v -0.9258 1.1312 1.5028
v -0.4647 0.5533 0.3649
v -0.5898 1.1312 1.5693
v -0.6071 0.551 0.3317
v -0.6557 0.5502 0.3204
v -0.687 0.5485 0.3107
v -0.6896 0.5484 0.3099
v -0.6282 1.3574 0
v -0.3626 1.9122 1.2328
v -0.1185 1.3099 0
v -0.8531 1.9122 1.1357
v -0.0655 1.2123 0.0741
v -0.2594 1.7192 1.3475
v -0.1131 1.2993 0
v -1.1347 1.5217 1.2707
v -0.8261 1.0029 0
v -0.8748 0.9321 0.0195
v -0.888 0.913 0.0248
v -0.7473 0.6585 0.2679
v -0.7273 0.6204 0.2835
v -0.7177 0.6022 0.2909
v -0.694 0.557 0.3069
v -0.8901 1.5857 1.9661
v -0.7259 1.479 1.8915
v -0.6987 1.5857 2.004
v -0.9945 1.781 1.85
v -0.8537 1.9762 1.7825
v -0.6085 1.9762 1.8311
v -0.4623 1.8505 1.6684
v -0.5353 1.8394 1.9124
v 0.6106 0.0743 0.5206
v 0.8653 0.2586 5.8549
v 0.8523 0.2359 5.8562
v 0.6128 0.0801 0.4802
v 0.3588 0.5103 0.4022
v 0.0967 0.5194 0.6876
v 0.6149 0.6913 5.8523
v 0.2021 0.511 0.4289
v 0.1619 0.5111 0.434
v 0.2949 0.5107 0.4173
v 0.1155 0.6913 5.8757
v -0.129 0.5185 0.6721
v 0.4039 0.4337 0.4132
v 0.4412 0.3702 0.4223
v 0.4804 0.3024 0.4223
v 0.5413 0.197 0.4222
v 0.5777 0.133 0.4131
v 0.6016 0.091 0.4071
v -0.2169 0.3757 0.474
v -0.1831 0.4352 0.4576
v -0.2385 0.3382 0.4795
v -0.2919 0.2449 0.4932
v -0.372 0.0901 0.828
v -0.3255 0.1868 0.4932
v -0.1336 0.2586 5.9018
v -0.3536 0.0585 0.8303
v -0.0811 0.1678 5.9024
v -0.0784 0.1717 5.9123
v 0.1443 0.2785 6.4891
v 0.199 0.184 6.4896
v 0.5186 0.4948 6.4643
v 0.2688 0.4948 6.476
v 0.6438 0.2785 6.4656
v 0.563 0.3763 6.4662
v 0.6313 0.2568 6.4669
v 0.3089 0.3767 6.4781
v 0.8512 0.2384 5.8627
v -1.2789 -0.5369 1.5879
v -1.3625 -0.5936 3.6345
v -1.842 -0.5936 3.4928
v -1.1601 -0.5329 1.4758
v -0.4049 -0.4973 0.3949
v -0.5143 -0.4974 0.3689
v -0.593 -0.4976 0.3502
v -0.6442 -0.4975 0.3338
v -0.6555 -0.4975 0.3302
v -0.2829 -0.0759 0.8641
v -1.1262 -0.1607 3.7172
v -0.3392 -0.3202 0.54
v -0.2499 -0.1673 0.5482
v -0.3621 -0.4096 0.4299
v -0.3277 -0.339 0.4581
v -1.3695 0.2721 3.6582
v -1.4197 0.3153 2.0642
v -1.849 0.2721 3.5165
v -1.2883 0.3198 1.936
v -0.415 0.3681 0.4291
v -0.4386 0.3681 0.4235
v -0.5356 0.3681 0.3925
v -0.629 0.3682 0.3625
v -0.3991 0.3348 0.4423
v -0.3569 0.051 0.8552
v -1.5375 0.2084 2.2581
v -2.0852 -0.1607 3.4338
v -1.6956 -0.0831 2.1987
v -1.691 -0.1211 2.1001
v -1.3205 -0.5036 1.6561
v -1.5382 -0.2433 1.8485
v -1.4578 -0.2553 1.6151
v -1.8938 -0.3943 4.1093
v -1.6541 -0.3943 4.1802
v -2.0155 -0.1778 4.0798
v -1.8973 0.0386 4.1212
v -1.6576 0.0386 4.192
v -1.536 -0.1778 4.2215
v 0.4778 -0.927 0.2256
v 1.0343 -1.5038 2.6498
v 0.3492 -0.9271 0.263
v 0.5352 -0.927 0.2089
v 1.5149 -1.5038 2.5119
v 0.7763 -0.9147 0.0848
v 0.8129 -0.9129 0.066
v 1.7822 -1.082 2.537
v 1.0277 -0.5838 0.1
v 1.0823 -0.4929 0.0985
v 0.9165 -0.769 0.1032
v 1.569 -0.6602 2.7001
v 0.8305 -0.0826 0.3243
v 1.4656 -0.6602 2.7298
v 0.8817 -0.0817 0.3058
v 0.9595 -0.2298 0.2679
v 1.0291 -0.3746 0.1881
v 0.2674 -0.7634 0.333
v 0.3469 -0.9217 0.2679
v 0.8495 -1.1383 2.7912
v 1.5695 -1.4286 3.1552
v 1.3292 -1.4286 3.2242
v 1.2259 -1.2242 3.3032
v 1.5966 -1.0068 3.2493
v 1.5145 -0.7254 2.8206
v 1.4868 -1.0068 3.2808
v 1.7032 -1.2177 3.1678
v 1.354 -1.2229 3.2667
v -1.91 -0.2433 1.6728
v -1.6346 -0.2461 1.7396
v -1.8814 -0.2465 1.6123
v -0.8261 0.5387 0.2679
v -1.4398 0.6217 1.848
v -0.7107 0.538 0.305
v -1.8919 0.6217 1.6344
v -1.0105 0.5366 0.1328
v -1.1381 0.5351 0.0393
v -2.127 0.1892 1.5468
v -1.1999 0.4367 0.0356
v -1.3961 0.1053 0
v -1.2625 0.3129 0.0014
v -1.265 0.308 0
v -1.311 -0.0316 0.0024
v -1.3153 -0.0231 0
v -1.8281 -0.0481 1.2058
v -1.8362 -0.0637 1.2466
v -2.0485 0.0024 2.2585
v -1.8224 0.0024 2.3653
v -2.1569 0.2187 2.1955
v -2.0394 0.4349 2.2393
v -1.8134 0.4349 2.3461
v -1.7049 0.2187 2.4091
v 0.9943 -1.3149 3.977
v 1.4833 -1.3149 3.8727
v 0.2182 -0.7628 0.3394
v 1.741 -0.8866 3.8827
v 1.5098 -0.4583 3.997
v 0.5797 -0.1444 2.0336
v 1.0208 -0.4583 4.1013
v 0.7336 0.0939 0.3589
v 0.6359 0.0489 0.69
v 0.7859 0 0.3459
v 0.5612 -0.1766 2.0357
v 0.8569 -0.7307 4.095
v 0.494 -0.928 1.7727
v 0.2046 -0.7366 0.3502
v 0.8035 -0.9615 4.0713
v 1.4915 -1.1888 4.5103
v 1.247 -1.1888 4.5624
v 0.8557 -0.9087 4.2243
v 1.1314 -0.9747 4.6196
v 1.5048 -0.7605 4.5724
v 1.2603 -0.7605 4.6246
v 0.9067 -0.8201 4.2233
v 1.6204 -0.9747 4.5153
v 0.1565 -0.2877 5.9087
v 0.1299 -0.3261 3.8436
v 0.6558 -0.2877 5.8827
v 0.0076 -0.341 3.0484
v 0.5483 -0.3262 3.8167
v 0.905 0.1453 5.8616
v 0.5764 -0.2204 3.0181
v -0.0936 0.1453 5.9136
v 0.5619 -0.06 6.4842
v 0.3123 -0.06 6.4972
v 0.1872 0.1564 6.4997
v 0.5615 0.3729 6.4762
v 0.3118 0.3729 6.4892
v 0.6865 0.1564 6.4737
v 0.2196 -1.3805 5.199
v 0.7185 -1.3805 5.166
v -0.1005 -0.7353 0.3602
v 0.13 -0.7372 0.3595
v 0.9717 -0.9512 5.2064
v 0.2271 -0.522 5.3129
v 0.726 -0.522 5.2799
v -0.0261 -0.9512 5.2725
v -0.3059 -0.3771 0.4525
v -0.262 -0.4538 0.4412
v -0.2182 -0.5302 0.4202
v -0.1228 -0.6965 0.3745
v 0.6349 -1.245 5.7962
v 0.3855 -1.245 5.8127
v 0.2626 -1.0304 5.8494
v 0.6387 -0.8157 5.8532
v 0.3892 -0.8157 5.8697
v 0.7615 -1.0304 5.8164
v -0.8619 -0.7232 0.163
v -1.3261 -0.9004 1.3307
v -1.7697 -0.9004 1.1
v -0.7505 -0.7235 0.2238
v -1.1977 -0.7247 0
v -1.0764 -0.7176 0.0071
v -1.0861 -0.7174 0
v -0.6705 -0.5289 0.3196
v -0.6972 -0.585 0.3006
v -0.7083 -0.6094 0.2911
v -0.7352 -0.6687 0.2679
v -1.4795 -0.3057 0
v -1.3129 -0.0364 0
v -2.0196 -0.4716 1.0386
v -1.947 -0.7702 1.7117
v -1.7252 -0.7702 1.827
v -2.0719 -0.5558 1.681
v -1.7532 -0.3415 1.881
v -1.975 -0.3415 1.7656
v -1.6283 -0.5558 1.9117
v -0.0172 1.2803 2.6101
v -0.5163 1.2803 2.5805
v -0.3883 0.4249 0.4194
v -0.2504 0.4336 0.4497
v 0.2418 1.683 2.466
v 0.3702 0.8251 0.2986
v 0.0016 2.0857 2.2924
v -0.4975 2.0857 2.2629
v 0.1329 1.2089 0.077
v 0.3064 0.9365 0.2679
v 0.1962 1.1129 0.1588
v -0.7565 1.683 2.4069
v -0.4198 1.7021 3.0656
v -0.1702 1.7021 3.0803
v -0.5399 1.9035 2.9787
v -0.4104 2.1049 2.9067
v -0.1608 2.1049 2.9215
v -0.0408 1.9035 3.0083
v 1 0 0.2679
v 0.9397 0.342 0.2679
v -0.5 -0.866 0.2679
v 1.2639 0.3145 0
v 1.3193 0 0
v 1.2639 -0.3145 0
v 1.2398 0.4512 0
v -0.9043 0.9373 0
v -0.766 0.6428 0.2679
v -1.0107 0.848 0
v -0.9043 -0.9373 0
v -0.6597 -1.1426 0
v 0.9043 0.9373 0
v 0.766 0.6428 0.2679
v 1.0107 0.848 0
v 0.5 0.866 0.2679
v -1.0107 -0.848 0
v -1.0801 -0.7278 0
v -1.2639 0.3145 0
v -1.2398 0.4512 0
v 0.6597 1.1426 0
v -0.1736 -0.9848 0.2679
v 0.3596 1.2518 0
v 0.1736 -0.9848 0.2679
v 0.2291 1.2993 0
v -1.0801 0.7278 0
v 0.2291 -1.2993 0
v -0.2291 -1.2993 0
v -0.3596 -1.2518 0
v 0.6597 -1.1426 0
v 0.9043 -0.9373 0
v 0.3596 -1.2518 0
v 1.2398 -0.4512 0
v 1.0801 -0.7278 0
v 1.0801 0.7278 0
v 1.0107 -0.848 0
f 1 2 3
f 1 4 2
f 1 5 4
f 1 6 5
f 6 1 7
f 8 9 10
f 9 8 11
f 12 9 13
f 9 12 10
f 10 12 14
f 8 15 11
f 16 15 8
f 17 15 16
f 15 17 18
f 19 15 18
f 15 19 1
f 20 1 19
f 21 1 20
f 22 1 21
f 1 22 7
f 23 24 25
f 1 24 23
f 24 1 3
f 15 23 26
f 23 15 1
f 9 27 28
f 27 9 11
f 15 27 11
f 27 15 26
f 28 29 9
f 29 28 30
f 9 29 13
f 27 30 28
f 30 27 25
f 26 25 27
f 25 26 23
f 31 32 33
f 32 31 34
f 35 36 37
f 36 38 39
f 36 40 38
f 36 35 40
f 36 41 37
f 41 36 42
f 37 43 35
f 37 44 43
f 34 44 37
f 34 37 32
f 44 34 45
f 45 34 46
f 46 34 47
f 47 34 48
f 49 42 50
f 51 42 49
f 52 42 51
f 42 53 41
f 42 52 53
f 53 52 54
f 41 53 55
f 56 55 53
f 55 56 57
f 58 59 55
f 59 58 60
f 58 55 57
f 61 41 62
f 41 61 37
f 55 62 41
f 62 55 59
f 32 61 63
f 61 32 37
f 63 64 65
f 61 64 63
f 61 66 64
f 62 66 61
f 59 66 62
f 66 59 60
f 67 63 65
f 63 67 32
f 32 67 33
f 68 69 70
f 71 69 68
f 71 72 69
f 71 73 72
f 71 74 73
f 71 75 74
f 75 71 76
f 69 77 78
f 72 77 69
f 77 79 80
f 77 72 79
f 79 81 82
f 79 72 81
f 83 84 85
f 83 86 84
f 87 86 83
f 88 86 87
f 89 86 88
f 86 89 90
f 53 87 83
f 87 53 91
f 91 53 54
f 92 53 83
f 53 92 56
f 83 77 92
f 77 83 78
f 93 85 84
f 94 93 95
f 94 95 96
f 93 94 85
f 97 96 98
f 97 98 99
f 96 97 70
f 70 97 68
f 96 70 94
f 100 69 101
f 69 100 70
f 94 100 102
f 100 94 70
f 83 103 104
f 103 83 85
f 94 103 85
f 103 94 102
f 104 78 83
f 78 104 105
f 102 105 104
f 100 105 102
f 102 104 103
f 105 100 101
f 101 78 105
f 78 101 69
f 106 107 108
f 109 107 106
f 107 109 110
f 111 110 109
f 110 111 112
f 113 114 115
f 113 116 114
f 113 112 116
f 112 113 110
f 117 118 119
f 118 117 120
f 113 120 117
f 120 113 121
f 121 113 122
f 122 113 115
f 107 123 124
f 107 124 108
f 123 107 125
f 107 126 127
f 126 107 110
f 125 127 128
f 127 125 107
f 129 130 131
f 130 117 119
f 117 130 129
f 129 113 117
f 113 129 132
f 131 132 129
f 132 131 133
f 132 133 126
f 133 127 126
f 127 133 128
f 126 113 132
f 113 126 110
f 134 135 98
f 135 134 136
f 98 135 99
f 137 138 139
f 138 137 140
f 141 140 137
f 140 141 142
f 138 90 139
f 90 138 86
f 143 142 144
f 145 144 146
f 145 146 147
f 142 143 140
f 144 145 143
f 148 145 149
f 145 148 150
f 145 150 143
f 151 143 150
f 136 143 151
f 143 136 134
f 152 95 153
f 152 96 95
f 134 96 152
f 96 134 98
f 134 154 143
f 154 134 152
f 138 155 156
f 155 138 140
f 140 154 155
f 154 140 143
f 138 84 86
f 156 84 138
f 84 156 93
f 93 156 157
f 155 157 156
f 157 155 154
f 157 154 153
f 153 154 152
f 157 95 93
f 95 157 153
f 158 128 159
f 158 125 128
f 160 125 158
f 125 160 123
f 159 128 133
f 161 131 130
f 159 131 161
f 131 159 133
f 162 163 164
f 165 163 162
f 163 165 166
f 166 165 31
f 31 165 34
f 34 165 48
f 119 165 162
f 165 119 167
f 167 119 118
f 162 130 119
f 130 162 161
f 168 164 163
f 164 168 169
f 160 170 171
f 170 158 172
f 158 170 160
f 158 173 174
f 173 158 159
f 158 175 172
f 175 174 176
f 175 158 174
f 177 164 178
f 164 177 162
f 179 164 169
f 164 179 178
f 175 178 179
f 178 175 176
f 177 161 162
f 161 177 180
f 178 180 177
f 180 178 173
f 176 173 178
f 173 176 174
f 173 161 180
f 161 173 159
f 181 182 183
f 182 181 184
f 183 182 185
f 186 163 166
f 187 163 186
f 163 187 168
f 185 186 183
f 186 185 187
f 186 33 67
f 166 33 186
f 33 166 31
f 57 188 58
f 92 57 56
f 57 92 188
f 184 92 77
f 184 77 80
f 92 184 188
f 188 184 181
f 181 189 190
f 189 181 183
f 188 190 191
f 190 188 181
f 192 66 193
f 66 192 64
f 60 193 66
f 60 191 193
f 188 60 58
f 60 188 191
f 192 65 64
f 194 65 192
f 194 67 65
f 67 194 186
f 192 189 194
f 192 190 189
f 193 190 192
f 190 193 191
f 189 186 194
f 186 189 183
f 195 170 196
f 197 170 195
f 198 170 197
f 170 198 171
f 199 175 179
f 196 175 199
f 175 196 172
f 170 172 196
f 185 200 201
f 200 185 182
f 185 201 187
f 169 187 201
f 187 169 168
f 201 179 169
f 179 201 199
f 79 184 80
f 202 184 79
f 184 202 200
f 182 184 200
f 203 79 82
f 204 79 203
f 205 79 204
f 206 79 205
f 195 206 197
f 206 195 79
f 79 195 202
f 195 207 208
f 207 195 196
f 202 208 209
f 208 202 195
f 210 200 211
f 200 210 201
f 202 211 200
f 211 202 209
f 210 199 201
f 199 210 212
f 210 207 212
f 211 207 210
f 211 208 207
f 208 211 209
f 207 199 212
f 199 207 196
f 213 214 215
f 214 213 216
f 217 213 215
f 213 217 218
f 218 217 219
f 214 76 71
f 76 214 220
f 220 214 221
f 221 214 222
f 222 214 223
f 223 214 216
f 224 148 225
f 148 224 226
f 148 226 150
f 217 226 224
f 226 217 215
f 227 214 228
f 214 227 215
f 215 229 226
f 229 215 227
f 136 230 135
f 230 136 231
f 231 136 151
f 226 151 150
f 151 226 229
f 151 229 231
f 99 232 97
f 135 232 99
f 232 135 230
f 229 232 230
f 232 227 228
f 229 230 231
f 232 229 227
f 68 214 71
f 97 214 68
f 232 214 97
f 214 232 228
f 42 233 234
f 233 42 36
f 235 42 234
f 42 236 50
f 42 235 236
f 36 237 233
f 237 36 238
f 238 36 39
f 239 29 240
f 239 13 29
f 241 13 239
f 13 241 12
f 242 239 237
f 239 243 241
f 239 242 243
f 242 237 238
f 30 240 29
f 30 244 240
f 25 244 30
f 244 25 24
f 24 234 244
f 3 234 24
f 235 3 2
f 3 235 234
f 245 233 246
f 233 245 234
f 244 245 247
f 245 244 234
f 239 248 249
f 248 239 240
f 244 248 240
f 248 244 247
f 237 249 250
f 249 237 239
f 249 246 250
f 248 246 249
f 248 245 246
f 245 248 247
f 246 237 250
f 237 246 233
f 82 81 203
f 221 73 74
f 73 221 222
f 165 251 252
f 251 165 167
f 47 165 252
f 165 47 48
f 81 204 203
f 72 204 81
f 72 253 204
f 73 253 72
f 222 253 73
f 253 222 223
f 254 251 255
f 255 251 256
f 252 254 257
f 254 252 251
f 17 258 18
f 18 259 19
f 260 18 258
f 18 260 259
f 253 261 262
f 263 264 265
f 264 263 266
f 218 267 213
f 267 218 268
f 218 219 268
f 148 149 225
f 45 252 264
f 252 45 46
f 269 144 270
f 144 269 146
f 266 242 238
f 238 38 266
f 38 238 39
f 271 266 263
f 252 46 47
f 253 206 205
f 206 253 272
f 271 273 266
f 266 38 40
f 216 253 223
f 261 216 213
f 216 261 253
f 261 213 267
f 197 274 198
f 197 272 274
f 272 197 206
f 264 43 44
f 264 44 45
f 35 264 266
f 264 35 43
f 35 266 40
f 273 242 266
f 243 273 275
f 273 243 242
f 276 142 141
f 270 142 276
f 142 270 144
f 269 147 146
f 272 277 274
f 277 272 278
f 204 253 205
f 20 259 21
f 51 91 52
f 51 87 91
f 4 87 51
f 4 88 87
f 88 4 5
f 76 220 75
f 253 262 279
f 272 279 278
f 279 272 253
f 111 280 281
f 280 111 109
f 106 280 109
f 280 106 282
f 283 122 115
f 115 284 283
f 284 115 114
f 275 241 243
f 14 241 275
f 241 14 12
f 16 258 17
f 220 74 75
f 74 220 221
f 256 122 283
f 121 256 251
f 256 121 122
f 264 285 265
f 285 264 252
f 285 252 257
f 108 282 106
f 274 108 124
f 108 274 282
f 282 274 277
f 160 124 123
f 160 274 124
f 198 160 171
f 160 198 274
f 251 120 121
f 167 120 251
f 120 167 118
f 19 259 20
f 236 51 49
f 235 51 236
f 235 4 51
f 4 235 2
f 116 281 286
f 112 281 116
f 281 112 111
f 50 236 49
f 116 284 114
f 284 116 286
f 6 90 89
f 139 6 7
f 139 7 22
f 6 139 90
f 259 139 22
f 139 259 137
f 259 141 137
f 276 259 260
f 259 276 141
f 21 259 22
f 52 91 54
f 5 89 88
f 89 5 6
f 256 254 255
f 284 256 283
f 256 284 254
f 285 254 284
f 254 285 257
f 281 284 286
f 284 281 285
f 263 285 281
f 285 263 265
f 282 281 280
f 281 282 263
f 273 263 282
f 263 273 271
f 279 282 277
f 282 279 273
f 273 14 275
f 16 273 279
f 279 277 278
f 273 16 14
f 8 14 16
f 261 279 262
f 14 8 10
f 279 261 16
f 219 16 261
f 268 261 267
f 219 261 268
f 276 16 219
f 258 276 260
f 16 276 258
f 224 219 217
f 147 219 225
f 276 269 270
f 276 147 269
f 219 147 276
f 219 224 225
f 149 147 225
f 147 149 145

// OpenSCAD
//A way to save your "random" arrangement
seed=74;				
//Number of crystals
num=10;							
//Width of crystals
wide=1;
//Height of each crystal
high=6;
//Number of sides on each crystal
side=6;
//Lower numbers will have shorter outer crystals
dropoff=.8;
//Overhang angle of the outermost crystals
bouquet_angle=30;
//The density of the crystals
density=10;
R_max=wide*num/density;
angle=rands(0,360*10,num+1,seed);
rad=rands(0,R_max,num+1,seed);
hyp=R_max/sin(bouquet_angle);
adj=R_max*cos(bouquet_angle)/sin(bouquet_angle);
difference(){
	union(){
	translate([0,0,-2*adj+hyp]) 
		sphere(hyp,$fn=3*side);
	for(i=[1:num]){
		translate([rad[i]*cos(angle[i]),rad[i]*sin(angle[i]),0]) 
			rotate([-bouquet_angle*sin(angle[i])*rad[i]/R_max,bouquet_angle*cos(angle[i])*rad[i]/R_max,0])
				crystal(side,high*exp(-pow((rad[i]/(dropoff*R_max)),2)),wide/2,(high)/10);
		}
	}
	translate([0,0,-hyp]) 
		cube(2*hyp,true);
	}

module crystal(sides, height, width, taper_height){
	cylinder(height,width,width,$fn=sides);
	translate([0,0,height]) 
		cylinder(taper_height,width,width/2,$fn=sides);
	}
